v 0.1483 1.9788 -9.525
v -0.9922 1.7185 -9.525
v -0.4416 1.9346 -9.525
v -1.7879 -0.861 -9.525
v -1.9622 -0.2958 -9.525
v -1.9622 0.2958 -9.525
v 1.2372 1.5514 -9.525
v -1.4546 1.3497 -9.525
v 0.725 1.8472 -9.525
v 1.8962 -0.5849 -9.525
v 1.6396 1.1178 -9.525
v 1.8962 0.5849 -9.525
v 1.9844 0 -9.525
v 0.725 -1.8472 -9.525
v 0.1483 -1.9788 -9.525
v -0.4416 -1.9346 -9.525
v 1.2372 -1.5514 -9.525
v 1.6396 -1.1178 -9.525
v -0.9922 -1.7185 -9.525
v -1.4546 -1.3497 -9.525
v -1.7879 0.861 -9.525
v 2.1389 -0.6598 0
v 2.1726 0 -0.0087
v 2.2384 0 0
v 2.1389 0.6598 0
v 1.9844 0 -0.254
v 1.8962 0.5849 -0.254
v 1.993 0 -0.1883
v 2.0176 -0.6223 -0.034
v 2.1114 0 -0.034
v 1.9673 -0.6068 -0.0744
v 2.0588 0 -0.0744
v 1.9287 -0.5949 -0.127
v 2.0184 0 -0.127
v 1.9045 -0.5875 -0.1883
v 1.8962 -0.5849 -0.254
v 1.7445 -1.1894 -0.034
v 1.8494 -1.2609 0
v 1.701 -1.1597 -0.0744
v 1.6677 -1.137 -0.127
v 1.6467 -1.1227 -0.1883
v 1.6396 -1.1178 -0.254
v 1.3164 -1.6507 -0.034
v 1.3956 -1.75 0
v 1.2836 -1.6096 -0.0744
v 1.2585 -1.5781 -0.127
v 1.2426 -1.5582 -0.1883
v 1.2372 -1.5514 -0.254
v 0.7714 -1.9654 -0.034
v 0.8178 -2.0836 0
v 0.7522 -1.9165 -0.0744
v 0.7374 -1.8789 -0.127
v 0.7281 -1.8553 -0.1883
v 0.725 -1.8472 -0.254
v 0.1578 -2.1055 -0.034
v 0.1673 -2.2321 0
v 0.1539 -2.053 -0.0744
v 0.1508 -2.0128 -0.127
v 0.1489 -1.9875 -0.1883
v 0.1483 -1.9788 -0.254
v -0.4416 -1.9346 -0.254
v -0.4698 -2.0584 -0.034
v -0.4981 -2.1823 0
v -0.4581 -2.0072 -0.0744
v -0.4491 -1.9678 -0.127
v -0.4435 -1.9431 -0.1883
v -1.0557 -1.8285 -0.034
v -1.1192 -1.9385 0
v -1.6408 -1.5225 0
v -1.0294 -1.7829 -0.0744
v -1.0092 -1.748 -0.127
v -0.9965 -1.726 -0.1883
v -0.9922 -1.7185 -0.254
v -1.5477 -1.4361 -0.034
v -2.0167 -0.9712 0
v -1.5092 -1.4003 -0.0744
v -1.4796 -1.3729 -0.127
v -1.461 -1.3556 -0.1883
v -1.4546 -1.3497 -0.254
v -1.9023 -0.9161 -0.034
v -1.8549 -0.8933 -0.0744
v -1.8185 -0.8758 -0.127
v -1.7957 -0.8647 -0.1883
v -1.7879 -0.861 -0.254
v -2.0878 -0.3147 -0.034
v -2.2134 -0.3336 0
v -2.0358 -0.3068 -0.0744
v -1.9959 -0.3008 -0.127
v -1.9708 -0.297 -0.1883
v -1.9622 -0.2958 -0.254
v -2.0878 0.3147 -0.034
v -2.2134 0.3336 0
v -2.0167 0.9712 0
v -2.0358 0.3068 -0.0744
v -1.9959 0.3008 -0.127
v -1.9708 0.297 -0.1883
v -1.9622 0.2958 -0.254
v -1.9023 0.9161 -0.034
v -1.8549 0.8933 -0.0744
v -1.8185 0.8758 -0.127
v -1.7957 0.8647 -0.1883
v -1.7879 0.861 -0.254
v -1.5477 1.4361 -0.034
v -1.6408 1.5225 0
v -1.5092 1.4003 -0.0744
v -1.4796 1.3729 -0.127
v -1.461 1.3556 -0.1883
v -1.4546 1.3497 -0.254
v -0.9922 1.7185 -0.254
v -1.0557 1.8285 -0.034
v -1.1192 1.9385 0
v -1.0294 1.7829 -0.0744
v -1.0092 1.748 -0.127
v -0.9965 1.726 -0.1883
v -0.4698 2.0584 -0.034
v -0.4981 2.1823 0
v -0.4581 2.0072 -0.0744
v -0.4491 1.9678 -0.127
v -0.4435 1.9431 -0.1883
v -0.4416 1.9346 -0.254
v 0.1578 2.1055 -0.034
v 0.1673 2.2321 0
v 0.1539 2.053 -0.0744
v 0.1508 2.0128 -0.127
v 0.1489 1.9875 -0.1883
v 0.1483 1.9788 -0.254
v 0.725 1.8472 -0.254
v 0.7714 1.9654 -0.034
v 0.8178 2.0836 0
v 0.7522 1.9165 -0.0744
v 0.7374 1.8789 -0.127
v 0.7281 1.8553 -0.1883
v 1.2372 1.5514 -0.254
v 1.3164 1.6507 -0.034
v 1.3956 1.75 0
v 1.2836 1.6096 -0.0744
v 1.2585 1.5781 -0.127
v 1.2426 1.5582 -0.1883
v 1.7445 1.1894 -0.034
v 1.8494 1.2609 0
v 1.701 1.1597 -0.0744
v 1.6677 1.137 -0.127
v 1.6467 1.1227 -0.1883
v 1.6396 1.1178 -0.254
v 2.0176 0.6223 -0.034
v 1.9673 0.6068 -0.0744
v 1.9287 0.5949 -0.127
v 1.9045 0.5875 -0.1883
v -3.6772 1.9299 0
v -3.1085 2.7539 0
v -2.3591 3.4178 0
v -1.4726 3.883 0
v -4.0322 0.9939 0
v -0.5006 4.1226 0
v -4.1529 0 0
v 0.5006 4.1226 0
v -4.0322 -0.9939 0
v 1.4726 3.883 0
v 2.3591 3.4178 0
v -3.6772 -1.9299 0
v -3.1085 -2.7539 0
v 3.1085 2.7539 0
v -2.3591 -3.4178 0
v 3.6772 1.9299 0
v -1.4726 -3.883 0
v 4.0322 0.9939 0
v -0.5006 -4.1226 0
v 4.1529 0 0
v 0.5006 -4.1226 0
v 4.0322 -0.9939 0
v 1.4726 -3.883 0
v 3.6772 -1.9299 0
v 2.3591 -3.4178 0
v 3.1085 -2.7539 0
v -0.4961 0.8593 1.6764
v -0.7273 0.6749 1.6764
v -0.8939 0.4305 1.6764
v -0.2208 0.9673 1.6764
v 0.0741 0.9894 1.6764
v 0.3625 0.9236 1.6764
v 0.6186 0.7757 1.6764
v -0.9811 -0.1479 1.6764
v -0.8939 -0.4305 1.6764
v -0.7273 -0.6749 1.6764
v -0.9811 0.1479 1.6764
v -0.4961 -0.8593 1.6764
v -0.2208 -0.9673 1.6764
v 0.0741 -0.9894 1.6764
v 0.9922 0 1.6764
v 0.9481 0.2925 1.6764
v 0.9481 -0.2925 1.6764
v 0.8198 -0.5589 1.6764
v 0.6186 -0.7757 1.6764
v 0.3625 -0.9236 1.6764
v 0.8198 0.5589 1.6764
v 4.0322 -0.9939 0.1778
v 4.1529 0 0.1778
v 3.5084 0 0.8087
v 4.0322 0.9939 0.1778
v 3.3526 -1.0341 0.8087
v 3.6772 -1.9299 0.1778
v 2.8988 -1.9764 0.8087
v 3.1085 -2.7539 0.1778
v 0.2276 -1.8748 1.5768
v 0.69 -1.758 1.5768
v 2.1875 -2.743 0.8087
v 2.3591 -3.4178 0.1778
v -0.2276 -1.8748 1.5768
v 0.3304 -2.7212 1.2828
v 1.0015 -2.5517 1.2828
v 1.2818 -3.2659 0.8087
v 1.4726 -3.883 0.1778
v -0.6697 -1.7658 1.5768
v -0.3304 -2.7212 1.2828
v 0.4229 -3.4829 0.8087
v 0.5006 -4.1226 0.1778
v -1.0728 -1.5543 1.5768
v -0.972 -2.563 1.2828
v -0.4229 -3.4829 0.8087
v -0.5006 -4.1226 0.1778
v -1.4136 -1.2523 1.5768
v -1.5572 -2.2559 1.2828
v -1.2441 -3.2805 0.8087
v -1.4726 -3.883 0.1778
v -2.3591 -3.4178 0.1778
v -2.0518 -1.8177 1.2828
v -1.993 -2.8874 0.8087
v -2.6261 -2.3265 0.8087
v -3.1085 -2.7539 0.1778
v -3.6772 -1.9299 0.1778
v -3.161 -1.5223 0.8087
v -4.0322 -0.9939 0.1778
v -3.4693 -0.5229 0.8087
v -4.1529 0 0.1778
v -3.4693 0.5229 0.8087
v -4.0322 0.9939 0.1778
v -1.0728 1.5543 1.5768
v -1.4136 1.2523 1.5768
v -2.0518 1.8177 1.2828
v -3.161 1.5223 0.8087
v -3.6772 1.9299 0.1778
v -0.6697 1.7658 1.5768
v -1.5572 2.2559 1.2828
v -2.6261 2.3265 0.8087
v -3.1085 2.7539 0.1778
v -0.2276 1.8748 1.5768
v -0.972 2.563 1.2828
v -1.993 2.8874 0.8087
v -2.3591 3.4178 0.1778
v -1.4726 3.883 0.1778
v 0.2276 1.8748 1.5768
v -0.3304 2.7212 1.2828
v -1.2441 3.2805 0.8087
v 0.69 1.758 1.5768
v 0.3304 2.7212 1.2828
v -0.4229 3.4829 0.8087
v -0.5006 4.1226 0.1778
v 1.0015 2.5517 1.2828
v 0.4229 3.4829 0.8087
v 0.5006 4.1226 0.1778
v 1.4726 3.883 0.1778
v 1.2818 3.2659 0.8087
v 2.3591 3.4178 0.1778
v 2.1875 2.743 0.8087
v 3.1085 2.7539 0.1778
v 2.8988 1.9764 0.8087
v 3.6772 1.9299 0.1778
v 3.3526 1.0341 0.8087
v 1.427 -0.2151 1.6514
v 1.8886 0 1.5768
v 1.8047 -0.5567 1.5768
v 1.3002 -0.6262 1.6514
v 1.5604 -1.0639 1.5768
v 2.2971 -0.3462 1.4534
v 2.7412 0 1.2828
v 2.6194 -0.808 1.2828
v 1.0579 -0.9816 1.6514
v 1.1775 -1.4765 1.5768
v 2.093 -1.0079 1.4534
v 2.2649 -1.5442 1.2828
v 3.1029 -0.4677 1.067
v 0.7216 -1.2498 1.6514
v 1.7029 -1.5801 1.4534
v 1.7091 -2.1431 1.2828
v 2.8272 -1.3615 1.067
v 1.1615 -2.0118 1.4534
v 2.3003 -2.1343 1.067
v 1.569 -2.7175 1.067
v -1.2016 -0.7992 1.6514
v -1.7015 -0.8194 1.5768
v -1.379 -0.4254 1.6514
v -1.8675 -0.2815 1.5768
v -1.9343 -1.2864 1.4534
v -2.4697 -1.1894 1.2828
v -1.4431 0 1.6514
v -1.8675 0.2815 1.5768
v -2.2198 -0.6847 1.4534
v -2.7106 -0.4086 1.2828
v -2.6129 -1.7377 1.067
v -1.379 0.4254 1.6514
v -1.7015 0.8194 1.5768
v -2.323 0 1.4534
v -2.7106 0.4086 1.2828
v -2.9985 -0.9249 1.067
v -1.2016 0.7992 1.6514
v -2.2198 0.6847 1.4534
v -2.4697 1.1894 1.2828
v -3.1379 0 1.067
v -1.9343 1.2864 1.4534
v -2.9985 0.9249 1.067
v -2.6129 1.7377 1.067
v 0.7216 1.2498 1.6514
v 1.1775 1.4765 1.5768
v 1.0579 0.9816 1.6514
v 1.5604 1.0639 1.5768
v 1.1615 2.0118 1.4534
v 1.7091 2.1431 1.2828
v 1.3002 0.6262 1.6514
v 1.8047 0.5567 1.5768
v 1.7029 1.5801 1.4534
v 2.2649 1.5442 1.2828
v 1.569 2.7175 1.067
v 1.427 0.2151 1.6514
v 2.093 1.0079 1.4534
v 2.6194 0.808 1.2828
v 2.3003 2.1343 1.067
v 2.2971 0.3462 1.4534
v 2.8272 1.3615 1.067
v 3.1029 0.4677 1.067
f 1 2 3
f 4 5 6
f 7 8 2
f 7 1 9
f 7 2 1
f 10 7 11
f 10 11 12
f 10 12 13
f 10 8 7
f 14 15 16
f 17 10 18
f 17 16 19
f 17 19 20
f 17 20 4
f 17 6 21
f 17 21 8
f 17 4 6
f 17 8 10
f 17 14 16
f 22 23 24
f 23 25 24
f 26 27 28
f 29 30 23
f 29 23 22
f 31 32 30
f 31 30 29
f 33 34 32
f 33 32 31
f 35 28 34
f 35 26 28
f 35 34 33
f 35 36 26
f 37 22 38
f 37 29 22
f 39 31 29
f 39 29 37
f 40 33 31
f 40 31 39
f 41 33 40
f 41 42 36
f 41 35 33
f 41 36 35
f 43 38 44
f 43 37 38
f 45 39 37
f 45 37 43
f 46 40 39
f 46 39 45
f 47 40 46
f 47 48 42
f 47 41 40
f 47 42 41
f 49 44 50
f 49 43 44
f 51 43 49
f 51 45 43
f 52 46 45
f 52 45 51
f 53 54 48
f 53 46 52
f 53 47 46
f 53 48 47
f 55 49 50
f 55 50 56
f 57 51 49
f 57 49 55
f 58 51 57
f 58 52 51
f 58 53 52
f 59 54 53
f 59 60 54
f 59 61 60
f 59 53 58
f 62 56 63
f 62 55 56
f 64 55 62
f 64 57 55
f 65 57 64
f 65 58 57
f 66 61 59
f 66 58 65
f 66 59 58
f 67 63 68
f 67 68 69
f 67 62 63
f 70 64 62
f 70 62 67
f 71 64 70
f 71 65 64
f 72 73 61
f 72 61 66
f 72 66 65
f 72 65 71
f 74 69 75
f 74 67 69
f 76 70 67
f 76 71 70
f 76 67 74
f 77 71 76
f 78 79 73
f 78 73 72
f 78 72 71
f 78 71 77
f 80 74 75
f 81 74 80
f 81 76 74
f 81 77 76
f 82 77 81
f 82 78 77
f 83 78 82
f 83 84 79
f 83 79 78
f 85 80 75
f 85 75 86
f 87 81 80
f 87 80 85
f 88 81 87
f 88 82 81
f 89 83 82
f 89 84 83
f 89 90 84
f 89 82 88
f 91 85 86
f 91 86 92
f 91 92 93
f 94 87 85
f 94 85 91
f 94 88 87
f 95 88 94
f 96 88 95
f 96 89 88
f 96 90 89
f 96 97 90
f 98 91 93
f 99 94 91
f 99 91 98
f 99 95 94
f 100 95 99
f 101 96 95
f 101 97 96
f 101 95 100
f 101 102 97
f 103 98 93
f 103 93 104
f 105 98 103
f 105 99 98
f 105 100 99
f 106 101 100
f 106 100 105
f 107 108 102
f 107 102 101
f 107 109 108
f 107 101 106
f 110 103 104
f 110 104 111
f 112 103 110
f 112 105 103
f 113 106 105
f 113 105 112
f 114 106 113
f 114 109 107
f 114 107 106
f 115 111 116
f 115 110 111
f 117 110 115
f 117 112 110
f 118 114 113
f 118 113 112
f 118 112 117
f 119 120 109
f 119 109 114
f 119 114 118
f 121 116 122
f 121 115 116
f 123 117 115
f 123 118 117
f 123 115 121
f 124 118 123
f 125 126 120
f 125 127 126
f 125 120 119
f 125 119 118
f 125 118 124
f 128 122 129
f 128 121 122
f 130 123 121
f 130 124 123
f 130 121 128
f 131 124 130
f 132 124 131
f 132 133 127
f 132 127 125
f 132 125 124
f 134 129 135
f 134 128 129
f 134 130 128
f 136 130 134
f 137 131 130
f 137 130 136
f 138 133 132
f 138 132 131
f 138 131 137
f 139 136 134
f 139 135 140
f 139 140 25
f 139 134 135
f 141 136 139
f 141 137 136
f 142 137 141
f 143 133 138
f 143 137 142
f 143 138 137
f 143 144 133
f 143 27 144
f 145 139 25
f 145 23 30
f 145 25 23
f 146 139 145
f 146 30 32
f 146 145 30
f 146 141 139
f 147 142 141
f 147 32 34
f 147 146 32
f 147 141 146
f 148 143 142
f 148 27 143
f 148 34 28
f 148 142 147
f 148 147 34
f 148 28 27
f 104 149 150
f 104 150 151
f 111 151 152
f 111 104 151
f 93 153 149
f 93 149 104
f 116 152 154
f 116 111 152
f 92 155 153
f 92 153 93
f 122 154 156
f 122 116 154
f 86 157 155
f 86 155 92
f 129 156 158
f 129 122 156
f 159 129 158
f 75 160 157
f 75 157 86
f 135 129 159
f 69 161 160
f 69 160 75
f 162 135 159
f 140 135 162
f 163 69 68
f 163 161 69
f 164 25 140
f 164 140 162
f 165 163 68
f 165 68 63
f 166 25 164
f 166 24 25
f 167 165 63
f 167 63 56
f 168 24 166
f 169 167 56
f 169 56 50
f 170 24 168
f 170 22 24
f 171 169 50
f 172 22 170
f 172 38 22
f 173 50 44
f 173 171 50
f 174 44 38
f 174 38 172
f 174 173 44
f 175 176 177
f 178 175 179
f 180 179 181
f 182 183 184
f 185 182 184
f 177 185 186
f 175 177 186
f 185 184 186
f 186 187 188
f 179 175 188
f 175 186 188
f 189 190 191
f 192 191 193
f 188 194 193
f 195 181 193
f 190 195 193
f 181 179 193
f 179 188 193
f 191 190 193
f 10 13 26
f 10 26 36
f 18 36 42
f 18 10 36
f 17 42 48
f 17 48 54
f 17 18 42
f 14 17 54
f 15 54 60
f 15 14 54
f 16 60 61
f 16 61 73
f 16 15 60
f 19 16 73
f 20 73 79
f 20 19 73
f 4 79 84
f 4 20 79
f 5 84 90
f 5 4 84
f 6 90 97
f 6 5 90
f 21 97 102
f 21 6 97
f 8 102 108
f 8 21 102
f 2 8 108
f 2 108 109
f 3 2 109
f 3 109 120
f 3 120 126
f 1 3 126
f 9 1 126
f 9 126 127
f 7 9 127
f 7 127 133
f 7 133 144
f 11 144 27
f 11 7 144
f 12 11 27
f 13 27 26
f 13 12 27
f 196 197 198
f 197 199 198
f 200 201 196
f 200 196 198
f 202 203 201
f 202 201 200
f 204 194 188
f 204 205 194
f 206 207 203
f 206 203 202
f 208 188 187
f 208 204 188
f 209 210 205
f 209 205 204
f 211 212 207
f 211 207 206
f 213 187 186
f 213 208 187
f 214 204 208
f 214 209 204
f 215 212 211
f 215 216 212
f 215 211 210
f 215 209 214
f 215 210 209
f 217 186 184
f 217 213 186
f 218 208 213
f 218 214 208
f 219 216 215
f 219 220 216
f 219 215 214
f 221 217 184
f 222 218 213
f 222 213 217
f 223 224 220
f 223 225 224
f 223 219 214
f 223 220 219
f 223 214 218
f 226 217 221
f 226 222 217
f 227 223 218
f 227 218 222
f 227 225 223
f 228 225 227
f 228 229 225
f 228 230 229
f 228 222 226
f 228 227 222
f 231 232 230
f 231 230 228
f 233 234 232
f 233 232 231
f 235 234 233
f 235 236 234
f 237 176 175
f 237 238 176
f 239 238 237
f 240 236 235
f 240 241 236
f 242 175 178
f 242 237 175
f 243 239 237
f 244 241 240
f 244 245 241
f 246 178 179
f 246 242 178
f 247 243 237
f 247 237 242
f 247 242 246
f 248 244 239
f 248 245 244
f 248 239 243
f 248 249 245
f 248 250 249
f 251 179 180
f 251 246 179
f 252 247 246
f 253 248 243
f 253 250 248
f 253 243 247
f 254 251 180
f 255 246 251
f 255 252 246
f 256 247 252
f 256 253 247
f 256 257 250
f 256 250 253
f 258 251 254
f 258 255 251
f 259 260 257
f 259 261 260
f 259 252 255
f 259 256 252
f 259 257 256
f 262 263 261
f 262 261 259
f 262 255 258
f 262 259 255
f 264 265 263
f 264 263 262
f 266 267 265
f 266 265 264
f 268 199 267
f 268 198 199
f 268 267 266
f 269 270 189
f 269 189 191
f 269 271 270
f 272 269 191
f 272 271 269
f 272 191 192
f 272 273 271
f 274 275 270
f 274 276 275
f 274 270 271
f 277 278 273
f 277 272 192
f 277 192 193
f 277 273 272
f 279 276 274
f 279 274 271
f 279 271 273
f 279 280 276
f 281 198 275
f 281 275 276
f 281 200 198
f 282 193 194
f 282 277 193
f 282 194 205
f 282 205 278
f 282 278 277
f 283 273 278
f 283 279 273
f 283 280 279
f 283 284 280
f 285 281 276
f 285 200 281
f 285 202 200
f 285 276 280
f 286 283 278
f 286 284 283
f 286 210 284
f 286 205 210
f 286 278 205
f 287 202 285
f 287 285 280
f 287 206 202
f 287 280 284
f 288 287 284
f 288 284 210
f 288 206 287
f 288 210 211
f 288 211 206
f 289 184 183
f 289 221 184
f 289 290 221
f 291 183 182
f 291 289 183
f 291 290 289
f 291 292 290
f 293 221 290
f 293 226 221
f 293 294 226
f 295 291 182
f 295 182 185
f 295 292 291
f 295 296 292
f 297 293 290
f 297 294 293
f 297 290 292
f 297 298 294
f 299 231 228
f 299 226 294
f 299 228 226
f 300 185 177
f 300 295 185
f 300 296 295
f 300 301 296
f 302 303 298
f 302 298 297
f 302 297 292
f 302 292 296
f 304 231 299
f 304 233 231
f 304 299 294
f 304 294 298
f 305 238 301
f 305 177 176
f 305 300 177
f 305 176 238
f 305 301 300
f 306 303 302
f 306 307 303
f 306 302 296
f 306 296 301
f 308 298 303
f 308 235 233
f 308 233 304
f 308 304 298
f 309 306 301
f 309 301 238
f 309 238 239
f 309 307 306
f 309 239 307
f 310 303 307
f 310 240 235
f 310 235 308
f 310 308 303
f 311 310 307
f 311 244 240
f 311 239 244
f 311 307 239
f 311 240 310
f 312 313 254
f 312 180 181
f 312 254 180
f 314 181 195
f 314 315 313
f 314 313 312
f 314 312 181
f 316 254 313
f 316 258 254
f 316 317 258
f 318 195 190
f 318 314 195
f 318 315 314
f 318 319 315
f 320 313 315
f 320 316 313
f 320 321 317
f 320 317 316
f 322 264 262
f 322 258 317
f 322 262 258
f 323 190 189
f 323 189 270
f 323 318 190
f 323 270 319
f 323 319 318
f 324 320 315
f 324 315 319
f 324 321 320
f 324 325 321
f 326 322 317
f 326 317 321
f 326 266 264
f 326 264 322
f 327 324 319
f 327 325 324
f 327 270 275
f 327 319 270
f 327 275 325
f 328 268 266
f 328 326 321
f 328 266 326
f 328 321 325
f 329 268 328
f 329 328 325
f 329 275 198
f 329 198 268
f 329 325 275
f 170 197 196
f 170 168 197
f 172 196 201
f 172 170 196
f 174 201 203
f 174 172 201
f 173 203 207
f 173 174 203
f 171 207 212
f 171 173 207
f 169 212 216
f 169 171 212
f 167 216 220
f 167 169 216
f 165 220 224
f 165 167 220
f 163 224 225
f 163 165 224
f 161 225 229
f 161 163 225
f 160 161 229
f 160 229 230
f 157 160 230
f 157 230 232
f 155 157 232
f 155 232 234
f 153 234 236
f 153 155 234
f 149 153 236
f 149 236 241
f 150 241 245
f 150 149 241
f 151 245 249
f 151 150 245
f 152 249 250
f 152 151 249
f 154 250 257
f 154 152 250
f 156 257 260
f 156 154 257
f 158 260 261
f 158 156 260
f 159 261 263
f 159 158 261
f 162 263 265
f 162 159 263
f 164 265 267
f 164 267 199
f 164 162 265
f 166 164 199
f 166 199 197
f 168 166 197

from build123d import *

# Parameters (mm, degrees)
CUT_EXTRUDE1_DEPTH      = 22.542442188
CUT_EXTRUDE1_DEPTH_BACK = 22.542442188
CUT_EXTRUDE2_DEPTH      = 22.542442188
CUT_EXTRUDE2_DEPTH_BACK = 22.542442188
FILLET2_R               = 0.254
LPATTERN1_COUNT         = 18
LPATTERN1_PITCH         = 0.762
CUT_EXTRUDE3_DEPTH      = 22.542442285
CUT_EXTRUDE3_DEPTH_BACK = 22.542442285
SKETCH7_W               = 2.637927388
SKETCH7_H               = 20.320175892


with BuildPart() as part:
    # Sketch2 → Revolve1 (revolve)
    with BuildSketch(Plane(origin=(0, 0, 0), x_dir=(0, 0, -1), z_dir=(1, 0, 0)), mode=Mode.PRIVATE) as revolve1_sk:
        with BuildLine():
            Line((-20.7264, 0), (-20.7264, 0.9921875))
            Line((-20.7264, 0.9921875), (-1.6764, 0.9921875))
            ThreePointArc((-1.6764, 0.9921875), (-1.282773396, 2.741180458), (-0.1778, 4.1529))
            Line((-0.1778, 4.1529), (0, 4.1529))
            Line((0, 4.1529), (0, 1.984375))
            Line((0, 1.984375), (9.525, 1.984375))
            Line((9.525, 1.984375), (9.525, 1.870886692))
            Line((9.525, 1.870886692), (9.525, 0))
            Line((9.525, 0), (-20.7264, 0))
        make_face()
    revolve(revolve1_sk.sketch.rotate(Axis((0, 0, 20.7264), (0, 0, -1)), 90), axis=Axis((0, 0, 20.7264), (0, 0, -1)))

    # Sketch3 → Cut-Extrude1 (cut, two sides: drawn at the far end of the back side and taken through both)
    with BuildSketch(Plane(origin=(0, 0, 0), x_dir=(1, 0, 0), z_dir=(0, 1, 0)).offset(-CUT_EXTRUDE1_DEPTH_BACK)):
        Polygon((0, -20.7264), (1.1953875, -19.16854068), (1.1953875, -21.2344), (-1.1953875, -21.2344), (-1.1953875, -19.16854068), align=None)
    extrude(amount=CUT_EXTRUDE1_DEPTH + CUT_EXTRUDE1_DEPTH_BACK, mode=Mode.SUBTRACT)

    # Sketch5 → Cut-Extrude2 (cut, two sides: drawn at the far end of the back side and taken through both)
    with BuildSketch(Plane(origin=(0, 0, 0), x_dir=(0, 0, -1), z_dir=(1, 0, 0)).offset(-CUT_EXTRUDE2_DEPTH_BACK)):
        Polygon((-20.7264, 0), (-19.433356075, 1.3096875), (-21.0439, 1.3096875), (-21.0439, -1.3096875), (-19.433356075, -1.3096875), align=None)
    extrude(amount=CUT_EXTRUDE2_DEPTH + CUT_EXTRUDE2_DEPTH_BACK, mode=Mode.SUBTRACT)

    # Fillet2
    fillet2_edges = [part.edges().sort_by_distance(p)[0] for p in [
        (-1.984375, 0, 0),
    ]]
    fillet(fillet2_edges, radius=FILLET2_R)

    # Sketch6 → Cut-Revolve1 (revolve, cut)
    with BuildSketch(Plane(origin=(0, 0, 0), x_dir=(0, 0, -1), z_dir=(1, 0, 0)), mode=Mode.PRIVATE) as cut_revolve1_sk:
        with BuildLine():
            Line((-6.5913, 0.9921875), (-6.4389, 0.9921875))
            ThreePointArc((-6.4389, 0.9921875), (-6.5151, 0.9159875), (-6.5913, 0.9921875))
        make_face()
    cut_revolve1 = revolve(cut_revolve1_sk.sketch.rotate(Axis((0, 0, 20.7264), (0, 0, -1)), 90), axis=Axis((0, 0, 20.7264), (0, 0, -1)), mode=Mode.SUBTRACT)

    # LPattern1: Cut-Revolve1 ×18
    with Locations(*[(0, 0, i * LPATTERN1_PITCH) for i in range(1, LPATTERN1_COUNT)]):
        add(cut_revolve1, mode=Mode.SUBTRACT)

    # Sketch7 → Cut-Extrude3 (cut, two sides: drawn at the far end of the back side and taken through both)
    with BuildSketch(Plane(origin=(0, 0, 0), x_dir=(1, 0, 0), z_dir=(0, 1, 0)).offset(-CUT_EXTRUDE3_DEPTH_BACK)):
        with Locations((0.326776194, -11.836487946)):
            Rectangle(SKETCH7_W, SKETCH7_H)
    extrude(amount=CUT_EXTRUDE3_DEPTH + CUT_EXTRUDE3_DEPTH_BACK, mode=Mode.SUBTRACT)


solid = part.part
